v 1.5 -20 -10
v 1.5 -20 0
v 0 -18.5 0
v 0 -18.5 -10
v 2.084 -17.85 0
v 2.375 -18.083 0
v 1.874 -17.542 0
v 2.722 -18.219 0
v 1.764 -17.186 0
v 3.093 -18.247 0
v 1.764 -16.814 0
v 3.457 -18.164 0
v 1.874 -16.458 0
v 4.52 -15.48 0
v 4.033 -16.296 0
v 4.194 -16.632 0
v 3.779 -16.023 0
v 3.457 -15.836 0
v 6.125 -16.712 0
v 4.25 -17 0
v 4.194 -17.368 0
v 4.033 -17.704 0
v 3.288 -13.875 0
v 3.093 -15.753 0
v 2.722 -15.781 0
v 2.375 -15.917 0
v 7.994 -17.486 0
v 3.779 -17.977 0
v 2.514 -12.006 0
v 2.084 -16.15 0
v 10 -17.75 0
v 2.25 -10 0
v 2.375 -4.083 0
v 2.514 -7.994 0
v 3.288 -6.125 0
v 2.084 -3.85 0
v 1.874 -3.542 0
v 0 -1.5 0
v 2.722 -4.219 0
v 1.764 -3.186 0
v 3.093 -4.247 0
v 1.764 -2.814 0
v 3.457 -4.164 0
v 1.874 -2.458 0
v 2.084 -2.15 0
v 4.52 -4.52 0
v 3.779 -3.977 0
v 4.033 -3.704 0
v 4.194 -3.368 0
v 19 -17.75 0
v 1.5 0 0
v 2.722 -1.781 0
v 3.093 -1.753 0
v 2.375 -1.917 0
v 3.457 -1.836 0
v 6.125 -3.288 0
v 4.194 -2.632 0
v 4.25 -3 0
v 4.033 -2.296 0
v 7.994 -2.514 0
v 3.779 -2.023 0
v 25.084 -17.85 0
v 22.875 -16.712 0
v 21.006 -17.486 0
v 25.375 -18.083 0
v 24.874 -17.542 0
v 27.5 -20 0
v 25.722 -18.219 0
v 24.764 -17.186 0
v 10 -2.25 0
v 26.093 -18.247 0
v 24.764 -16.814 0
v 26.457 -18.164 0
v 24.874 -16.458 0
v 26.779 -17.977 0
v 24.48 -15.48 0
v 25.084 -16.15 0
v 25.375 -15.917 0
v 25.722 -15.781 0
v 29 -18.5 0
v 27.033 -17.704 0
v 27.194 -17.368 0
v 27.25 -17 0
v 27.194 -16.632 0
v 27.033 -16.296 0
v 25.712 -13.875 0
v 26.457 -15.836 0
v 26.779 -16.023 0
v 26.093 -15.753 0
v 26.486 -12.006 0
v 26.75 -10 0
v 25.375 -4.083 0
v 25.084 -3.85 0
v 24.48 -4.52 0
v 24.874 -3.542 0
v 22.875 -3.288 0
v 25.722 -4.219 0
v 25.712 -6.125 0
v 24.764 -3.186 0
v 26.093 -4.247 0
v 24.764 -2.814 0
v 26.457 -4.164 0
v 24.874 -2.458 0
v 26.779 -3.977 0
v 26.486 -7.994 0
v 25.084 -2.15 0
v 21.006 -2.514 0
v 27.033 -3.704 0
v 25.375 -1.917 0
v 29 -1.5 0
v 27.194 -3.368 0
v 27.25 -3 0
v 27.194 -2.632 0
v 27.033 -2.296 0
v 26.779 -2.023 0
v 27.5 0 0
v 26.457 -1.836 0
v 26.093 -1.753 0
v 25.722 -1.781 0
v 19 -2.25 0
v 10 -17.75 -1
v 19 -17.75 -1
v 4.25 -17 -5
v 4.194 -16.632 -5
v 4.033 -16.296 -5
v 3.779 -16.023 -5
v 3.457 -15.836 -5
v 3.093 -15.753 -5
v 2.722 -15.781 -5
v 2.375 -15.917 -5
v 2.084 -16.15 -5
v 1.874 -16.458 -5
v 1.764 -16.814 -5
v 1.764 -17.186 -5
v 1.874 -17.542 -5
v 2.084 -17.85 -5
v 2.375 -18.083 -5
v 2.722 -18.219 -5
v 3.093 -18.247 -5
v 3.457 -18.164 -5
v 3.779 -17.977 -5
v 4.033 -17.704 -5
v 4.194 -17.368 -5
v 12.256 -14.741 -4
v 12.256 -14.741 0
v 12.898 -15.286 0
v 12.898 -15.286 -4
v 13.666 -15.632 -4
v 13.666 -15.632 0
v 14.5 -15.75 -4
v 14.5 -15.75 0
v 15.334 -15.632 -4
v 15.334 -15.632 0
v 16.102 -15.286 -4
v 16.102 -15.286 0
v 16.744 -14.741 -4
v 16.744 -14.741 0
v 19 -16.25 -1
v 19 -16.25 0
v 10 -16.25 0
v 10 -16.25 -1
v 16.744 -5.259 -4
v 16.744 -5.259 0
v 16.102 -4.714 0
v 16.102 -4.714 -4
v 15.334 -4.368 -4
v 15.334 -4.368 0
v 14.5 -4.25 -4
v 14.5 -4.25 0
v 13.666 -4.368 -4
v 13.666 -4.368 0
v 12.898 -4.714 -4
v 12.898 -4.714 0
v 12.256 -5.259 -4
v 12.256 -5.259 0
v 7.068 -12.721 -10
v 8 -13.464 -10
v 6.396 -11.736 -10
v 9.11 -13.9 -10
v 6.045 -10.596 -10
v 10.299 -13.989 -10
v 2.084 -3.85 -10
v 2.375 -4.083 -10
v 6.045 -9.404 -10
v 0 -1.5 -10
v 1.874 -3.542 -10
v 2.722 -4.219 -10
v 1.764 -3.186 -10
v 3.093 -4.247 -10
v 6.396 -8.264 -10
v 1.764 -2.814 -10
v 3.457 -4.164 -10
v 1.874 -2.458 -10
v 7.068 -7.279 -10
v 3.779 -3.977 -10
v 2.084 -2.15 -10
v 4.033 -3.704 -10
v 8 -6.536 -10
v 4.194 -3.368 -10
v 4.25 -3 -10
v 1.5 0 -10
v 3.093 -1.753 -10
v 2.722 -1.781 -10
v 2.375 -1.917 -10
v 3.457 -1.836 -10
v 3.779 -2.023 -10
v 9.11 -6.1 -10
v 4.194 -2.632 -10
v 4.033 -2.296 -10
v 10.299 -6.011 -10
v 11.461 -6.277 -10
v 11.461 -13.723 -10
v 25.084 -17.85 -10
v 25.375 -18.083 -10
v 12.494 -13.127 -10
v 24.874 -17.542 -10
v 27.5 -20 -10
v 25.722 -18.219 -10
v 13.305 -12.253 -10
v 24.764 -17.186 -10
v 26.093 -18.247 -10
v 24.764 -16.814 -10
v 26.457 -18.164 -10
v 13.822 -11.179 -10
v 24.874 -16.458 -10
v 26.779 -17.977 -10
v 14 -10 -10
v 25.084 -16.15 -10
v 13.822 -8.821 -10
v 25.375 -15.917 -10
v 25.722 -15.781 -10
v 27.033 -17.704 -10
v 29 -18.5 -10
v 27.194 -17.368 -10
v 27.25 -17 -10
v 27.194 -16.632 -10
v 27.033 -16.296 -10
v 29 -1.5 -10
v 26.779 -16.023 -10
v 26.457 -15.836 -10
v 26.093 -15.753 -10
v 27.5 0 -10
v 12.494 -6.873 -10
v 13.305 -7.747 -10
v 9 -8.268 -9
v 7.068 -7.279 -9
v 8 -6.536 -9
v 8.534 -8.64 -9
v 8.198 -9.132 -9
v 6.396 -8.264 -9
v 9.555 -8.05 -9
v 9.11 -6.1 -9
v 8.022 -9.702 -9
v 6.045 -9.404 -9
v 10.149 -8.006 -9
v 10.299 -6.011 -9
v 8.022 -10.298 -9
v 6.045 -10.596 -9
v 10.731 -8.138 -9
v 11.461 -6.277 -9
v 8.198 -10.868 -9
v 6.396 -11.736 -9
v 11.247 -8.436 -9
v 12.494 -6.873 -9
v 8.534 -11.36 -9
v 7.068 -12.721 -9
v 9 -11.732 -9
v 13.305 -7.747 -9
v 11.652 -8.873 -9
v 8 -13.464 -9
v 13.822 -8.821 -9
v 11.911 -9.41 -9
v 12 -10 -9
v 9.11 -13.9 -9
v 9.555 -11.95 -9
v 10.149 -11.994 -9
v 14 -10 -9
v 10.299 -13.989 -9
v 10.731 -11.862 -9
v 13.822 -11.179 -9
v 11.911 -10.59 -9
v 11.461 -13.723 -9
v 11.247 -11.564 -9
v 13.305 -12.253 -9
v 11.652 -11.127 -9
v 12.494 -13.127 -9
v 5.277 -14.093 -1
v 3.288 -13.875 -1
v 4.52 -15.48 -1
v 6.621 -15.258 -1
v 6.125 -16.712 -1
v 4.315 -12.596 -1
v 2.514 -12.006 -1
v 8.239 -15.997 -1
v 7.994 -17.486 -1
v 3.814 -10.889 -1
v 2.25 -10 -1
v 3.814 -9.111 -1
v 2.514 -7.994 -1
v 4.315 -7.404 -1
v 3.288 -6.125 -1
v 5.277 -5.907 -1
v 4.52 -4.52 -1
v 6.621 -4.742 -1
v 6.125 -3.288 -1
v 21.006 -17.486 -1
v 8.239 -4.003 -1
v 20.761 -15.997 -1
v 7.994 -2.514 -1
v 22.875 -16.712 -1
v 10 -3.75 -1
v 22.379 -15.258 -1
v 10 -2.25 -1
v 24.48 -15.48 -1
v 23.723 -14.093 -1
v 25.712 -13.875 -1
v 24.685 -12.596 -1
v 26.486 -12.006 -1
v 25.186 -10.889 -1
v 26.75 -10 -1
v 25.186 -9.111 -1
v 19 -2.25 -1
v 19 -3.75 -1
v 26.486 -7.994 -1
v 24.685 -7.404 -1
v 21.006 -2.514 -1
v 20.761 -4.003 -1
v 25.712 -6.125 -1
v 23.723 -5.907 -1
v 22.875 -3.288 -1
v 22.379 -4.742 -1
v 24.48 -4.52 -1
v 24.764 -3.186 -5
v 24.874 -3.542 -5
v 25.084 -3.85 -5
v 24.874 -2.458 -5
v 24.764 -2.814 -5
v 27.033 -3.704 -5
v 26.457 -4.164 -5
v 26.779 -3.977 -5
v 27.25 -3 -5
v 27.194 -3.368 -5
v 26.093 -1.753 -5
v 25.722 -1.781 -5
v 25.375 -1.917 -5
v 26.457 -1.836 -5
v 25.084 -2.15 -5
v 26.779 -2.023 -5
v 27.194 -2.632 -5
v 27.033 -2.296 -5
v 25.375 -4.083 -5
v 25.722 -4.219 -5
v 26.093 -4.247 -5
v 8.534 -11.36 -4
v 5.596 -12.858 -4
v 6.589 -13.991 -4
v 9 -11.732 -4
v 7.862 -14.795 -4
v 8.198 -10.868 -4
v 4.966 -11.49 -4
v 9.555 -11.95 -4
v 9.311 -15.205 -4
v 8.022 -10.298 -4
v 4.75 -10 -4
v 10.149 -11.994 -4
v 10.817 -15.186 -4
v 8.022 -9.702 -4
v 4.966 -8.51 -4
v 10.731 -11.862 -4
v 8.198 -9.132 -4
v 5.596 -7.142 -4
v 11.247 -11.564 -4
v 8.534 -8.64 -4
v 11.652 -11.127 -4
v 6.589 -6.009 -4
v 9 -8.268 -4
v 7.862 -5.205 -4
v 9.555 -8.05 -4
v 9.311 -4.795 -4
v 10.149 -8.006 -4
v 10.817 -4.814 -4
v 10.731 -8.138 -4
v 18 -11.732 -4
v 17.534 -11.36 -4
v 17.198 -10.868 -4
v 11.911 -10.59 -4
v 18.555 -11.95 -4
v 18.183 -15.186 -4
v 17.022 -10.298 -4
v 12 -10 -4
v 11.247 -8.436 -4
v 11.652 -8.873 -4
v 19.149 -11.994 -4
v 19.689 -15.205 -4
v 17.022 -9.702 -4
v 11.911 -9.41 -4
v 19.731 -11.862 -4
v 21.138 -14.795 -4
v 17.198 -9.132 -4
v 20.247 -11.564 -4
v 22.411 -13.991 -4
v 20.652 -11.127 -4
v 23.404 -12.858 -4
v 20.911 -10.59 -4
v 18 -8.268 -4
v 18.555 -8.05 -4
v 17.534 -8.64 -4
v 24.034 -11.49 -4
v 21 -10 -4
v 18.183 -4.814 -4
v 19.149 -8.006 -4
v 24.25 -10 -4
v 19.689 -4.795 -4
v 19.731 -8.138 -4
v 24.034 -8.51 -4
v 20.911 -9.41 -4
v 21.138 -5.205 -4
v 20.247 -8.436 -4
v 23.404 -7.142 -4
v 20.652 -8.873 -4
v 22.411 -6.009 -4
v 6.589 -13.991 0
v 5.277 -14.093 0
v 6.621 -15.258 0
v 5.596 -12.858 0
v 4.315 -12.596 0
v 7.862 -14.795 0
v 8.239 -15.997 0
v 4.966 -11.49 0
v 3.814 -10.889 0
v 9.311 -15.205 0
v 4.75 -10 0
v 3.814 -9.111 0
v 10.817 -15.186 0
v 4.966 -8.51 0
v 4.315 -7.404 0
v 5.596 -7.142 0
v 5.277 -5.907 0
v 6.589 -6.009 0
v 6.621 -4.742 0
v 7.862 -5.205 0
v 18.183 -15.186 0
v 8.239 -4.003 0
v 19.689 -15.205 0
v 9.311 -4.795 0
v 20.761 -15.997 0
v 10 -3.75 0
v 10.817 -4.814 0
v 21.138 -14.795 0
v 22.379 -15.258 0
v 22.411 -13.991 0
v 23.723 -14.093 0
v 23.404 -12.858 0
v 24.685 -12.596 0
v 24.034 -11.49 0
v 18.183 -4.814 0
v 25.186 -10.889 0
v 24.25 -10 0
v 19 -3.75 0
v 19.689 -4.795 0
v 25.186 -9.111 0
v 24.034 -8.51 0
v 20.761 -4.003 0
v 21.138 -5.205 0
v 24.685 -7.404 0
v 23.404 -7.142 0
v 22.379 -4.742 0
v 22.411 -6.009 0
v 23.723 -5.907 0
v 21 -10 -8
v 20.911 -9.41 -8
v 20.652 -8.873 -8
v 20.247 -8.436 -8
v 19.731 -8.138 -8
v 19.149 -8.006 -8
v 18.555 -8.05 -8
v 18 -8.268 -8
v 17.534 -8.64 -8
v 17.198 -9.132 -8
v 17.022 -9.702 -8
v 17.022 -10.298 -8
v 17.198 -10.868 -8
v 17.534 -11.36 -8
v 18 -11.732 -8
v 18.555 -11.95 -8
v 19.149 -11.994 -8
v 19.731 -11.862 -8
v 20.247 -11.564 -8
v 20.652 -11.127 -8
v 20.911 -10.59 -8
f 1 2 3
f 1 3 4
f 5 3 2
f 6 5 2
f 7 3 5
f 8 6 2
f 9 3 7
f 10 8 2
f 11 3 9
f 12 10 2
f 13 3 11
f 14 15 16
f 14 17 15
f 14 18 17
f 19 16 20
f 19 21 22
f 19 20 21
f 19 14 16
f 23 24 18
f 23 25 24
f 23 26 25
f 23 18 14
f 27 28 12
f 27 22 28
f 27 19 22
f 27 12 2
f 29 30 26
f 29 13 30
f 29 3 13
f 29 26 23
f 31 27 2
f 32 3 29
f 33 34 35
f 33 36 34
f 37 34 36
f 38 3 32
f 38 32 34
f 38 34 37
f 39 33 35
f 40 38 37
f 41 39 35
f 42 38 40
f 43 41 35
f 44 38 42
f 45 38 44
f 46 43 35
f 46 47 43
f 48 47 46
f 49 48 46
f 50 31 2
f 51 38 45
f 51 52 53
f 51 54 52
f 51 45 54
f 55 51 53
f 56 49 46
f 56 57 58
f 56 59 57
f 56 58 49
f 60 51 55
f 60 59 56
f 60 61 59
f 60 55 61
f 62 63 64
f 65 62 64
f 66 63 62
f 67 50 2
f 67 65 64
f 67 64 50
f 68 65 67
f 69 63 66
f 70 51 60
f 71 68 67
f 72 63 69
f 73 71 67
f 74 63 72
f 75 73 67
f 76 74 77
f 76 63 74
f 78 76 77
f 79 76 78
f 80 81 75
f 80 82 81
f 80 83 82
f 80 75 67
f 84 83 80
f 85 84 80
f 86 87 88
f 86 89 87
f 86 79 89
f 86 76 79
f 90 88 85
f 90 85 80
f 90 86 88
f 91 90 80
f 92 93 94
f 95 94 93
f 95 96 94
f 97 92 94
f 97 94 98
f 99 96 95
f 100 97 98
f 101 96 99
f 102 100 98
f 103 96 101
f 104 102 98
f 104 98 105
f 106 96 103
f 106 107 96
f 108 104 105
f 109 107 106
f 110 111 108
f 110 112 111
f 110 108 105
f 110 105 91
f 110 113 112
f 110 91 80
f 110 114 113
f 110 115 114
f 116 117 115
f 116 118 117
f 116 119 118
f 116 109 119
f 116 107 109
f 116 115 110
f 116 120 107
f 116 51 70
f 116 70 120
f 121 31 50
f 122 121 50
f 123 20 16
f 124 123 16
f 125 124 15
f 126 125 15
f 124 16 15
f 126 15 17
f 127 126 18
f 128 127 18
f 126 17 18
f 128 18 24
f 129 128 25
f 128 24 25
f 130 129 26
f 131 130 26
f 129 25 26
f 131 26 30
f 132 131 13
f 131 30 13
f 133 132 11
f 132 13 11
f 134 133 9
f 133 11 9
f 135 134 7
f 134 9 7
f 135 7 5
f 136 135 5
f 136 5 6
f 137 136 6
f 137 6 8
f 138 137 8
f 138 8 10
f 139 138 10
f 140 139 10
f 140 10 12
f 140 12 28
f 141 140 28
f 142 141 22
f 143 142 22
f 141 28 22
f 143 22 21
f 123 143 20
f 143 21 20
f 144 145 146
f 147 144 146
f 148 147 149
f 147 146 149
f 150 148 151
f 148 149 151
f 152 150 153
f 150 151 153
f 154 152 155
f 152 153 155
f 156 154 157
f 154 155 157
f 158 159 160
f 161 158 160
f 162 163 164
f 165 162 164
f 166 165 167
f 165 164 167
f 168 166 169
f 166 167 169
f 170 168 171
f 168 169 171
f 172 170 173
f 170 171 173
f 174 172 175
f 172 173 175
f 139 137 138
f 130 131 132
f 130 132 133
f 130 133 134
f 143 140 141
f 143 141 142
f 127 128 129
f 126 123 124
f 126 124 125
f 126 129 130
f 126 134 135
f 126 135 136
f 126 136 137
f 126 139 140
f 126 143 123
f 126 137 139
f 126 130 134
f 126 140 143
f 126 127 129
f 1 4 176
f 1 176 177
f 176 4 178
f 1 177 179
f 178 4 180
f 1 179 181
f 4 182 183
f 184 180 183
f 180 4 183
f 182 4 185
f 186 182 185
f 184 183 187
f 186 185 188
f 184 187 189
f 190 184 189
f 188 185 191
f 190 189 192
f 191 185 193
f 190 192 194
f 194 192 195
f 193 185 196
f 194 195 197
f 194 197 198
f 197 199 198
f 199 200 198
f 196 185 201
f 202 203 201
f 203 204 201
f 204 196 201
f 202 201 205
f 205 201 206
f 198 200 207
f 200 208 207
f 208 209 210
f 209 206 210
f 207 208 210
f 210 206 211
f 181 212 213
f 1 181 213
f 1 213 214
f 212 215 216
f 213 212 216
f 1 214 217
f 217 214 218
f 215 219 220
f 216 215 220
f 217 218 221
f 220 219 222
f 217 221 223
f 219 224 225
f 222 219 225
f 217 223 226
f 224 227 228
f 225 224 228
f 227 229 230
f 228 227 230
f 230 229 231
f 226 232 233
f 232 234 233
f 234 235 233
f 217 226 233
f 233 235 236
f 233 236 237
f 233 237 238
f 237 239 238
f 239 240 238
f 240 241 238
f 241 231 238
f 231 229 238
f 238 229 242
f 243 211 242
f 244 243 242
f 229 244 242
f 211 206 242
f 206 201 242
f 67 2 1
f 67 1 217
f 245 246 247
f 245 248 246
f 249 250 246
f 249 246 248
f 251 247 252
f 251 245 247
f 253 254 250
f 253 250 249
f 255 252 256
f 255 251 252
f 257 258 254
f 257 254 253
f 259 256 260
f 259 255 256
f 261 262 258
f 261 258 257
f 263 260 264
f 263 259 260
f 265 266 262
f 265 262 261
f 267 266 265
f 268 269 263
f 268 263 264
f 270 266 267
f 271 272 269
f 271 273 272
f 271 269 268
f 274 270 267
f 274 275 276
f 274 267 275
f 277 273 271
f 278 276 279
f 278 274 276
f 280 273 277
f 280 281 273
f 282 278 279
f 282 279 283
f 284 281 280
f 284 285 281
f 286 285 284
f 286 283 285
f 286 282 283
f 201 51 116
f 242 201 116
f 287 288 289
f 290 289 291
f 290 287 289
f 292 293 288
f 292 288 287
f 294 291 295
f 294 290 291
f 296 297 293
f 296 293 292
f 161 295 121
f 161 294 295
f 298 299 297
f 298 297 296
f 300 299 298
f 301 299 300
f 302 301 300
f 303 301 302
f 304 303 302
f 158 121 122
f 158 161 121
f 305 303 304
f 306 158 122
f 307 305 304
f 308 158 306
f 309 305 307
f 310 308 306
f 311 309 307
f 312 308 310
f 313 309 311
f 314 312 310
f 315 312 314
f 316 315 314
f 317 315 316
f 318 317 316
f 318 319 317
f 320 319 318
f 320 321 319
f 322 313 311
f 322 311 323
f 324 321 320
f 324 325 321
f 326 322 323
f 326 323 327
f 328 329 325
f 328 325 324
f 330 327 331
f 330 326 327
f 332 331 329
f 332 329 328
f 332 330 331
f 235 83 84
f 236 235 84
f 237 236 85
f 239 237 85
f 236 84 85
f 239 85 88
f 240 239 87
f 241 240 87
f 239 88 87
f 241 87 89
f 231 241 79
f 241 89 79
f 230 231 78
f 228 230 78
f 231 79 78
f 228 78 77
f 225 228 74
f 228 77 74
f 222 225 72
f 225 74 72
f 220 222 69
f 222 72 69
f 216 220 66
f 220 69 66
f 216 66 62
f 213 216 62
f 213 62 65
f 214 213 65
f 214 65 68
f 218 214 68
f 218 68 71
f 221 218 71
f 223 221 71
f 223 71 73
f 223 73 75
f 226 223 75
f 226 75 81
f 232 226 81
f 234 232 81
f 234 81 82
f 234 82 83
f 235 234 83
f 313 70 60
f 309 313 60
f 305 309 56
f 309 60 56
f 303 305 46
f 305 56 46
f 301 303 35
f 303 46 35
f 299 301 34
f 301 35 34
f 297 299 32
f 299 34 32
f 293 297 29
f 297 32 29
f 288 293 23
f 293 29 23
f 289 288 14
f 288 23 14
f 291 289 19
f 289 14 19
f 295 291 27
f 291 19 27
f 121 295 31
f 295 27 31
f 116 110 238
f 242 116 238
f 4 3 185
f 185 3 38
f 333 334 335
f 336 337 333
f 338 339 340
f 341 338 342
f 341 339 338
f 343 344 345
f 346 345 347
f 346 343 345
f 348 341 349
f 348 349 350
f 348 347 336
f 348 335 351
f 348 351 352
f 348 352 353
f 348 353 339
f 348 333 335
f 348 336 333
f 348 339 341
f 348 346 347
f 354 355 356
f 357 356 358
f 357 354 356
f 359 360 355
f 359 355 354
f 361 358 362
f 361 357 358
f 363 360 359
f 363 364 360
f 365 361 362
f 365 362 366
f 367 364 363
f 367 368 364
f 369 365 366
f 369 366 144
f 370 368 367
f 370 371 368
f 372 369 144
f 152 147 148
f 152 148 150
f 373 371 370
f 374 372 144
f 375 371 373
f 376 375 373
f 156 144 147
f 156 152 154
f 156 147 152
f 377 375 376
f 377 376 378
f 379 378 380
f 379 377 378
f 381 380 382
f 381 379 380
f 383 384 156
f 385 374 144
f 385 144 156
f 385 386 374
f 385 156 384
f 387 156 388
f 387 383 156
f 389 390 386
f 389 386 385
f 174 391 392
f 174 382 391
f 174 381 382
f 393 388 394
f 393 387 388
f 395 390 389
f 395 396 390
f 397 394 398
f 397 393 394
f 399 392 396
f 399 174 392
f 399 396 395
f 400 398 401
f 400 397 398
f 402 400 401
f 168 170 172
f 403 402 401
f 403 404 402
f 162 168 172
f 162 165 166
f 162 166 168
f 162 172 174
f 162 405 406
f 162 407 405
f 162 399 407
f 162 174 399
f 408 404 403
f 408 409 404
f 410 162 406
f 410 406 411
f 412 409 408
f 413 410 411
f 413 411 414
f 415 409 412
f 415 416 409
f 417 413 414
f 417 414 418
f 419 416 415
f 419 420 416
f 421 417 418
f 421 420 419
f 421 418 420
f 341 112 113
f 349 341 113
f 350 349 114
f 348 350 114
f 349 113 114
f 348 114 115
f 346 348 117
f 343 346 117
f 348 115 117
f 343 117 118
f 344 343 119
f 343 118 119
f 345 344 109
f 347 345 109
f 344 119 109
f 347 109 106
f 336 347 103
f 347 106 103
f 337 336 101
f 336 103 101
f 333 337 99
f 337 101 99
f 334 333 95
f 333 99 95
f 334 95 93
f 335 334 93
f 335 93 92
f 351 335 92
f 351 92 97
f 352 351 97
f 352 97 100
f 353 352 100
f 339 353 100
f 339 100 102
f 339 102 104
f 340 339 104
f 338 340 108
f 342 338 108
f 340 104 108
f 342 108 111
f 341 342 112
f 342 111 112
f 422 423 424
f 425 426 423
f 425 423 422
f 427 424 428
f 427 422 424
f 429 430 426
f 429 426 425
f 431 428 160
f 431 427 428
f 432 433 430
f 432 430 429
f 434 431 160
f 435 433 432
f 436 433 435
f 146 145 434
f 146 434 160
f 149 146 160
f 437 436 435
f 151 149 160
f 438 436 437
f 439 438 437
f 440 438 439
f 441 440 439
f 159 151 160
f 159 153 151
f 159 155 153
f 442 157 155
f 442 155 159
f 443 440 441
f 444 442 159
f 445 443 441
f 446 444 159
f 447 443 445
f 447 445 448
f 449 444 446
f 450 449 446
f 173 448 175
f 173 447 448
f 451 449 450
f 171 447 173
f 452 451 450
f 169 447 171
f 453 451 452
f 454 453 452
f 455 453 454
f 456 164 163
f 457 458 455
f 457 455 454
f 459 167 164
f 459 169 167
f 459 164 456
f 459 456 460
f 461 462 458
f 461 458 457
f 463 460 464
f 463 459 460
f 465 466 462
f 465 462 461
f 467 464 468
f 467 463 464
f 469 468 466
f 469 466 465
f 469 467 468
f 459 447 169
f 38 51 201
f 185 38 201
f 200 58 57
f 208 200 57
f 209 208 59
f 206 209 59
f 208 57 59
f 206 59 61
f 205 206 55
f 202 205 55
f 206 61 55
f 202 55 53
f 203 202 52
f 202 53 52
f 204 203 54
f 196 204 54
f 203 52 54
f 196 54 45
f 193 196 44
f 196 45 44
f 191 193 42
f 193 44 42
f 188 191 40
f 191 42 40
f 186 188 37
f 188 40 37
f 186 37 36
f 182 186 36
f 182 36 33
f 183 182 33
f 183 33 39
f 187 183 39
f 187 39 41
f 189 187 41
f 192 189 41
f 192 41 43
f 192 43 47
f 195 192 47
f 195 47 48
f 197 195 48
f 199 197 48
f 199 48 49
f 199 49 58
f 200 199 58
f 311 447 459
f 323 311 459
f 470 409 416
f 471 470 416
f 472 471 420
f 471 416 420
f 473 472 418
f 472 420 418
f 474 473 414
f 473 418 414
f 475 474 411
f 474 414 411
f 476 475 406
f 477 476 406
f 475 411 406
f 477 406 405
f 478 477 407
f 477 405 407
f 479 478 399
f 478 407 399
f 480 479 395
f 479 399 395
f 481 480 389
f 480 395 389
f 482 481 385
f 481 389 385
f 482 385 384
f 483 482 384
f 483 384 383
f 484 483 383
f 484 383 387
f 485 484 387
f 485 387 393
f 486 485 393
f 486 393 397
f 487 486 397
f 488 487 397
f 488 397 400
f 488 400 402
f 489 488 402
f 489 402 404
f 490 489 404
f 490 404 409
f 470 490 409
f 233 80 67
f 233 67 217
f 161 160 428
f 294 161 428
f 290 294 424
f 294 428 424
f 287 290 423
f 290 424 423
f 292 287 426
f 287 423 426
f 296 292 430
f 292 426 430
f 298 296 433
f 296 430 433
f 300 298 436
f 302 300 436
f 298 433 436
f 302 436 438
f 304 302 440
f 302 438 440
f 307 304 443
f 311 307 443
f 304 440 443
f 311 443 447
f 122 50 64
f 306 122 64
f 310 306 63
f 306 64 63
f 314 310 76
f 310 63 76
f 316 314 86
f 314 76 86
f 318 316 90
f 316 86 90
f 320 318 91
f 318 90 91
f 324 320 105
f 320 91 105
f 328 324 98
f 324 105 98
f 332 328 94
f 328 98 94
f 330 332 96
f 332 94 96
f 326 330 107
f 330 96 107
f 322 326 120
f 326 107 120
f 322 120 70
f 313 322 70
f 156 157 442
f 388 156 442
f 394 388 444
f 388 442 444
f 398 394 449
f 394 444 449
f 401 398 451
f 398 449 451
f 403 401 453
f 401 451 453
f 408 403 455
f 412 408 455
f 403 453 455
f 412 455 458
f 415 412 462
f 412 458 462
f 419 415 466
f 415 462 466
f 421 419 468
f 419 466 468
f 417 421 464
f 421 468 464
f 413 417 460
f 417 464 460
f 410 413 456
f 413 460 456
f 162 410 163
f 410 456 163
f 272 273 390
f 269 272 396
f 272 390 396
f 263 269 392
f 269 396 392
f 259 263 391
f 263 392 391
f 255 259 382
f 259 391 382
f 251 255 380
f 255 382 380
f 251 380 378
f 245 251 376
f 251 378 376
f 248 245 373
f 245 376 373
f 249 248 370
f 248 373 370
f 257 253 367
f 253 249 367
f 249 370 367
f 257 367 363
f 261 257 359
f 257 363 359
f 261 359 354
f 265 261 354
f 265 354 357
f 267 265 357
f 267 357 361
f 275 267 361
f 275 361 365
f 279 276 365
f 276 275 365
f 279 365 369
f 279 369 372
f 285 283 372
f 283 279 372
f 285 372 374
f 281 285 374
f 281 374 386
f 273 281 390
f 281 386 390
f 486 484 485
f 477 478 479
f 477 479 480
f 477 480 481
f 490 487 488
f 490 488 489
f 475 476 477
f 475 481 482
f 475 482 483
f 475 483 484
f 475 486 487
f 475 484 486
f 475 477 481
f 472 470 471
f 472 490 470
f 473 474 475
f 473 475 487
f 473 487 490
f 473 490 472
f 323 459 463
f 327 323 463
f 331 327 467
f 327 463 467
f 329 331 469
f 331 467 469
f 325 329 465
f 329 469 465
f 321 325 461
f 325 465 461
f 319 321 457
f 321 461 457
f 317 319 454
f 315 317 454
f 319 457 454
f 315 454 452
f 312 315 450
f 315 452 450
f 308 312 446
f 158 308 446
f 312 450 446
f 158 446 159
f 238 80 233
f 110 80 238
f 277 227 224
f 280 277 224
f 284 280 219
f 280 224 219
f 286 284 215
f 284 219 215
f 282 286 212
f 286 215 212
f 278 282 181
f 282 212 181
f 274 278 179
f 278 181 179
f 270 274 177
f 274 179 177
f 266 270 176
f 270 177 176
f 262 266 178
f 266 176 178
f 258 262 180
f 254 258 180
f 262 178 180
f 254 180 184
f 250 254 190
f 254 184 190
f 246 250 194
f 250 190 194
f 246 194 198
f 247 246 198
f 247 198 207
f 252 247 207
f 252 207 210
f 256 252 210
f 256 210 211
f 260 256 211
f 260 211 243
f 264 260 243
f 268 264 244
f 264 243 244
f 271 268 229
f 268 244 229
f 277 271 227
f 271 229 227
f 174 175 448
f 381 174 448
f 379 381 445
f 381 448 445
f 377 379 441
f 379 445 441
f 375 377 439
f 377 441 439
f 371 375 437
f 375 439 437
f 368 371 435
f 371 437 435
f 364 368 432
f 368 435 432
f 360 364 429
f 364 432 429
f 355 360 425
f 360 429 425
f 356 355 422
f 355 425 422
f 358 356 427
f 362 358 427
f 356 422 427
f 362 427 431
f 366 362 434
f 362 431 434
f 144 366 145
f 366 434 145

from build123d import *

# Parameters (mm, degrees)
F0_W     = 29
F0_H     = 20
F0_R     = 1.25
F0_R_2   = 2
F1_DEPTH = 10
F2_DEPTH = 5
F3_DEPTH = 1
F4_DEPTH = 8
F5_DEPTH = 4
F6_R     = 4
F6_R_2   = 2
F7_DEPTH = 1
F8_SIZE  = 1.5


# Not quite as in the source:
# - a feature names something its author has since deleted; it is built from what else it names


with BuildPart() as f1:
    # F0 (on Top) → F1 (new body)
    with BuildSketch(Plane.XY):
        with Locations((14.5, -10)):
            Rectangle(F0_W, F0_H)
        with Locations((3, -17)):
            Circle(F0_R, mode=Mode.SUBTRACT)
        with Locations((26, -17)):
            Circle(F0_R, mode=Mode.SUBTRACT)
        with Locations((3, -3)):
            Circle(F0_R, mode=Mode.SUBTRACT)
        with BuildLine():
            Line((19, -17.75), (10, -17.75))
            ThreePointArc((10, -17.75), (2.25, -10), (10, -2.25))
            Line((10, -2.25), (19, -2.25))
            ThreePointArc((19, -2.25), (26.75, -10), (19, -17.75))
        make_face(mode=Mode.SUBTRACT)
        with Locations((26, -3)):
            Circle(F0_R, mode=Mode.SUBTRACT)
        with BuildLine():
            ThreePointArc((10, -2.25), (2.25, -10), (10, -17.75))
            Line((10, -17.75), (19, -17.75))
            ThreePointArc((19, -17.75), (26.75, -10), (19, -2.25))
            Line((19, -2.25), (10, -2.25))
        make_face()
        with BuildLine():
            ThreePointArc((10, -16.25), (3.75, -10), (10, -3.75))
            Line((10, -3.75), (19, -3.75))
            ThreePointArc((19, -3.75), (25.25, -10), (19, -16.25))
            Line((19, -16.25), (10, -16.25))
        make_face(mode=Mode.SUBTRACT)
        with BuildLine():
            Line((19, -3.75), (10, -3.75))
            ThreePointArc((10, -3.75), (3.75, -10), (10, -16.25))
            Line((10, -16.25), (19, -16.25))
            ThreePointArc((19, -16.25), (25.25, -10), (19, -3.75))
        make_face()
        with BuildLine():
            ThreePointArc((16.7443308628, -5.25927677), (24.25, -10), (16.7443308628, -14.74072323))
            ThreePointArc((16.7443308628, -14.74072323), (14.5, -15.75), (12.2556691372, -14.74072323))
            ThreePointArc((12.2556691372, -14.74072323), (4.75, -10), (12.2556691372, -5.25927677))
            ThreePointArc((12.2556691372, -5.25927677), (14.5, -4.25), (16.7443308628, -5.25927677))
        make_face(mode=Mode.SUBTRACT)
        with BuildLine():
            ThreePointArc((12.2556691372, -14.74072323), (14.5, -15.75), (16.7443308628, -14.74072323))
            ThreePointArc((16.7443308628, -14.74072323), (24.25, -10), (16.7443308628, -5.25927677))
            ThreePointArc((16.7443308628, -5.25927677), (14.5, -4.25), (12.2556691372, -5.25927677))
            ThreePointArc((12.2556691372, -5.25927677), (4.75, -10), (12.2556691372, -14.74072323))
        make_face()
        with Locations((10, -10)):
            Circle(F0_R_2, mode=Mode.SUBTRACT)
        with Locations((19, -10)):
            Circle(F0_R_2, mode=Mode.SUBTRACT)
        with Locations((19, -10)):
            Circle(F0_R_2)
        with Locations((3, -17)):
            Circle(F0_R)
        with Locations((26, -3)):
            Circle(F0_R)
    extrude(amount=-F1_DEPTH)

    # F0 (on Top) → F2 (cut)
    with BuildSketch(Plane.XY):
        with Locations((3, -3)):
            Circle(F0_R)
        with Locations((26, -3)):
            Circle(F0_R)
        with Locations((26, -17)):
            Circle(F0_R)
        with Locations((3, -17)):
            Circle(F0_R)
    extrude(amount=-F2_DEPTH, mode=Mode.SUBTRACT)

    # F0 (on Top) → F3 (cut)
    with BuildSketch(Plane.XY):
        with BuildLine():
            ThreePointArc((10, -2.25), (2.25, -10), (10, -17.75))
            Line((10, -17.75), (19, -17.75))
            ThreePointArc((19, -17.75), (26.75, -10), (19, -2.25))
            Line((19, -2.25), (10, -2.25))
        make_face()
        with BuildLine():
            ThreePointArc((10, -16.25), (3.75, -10), (10, -3.75))
            Line((10, -3.75), (19, -3.75))
            ThreePointArc((19, -3.75), (25.25, -10), (19, -16.25))
            Line((19, -16.25), (10, -16.25))
        make_face(mode=Mode.SUBTRACT)
    extrude(amount=-F3_DEPTH, mode=Mode.SUBTRACT)

    # F0 (on Top) → F4 (cut)
    with BuildSketch(Plane.XY):
        with Locations((19, -10)):
            Circle(F0_R_2)
    extrude(amount=-F4_DEPTH, mode=Mode.SUBTRACT)

    # F0 (on Top) → F5 (cut)
    with BuildSketch(Plane.XY):
        with BuildLine():
            ThreePointArc((12.2556691372, -14.74072323), (14.5, -15.75), (16.7443308628, -14.74072323))
            ThreePointArc((16.7443308628, -14.74072323), (24.25, -10), (16.7443308628, -5.25927677))
            ThreePointArc((16.7443308628, -5.25927677), (14.5, -4.25), (12.2556691372, -5.25927677))
            ThreePointArc((12.2556691372, -5.25927677), (4.75, -10), (12.2556691372, -14.74072323))
        make_face()
        with Locations((10, -10)):
            Circle(F0_R_2, mode=Mode.SUBTRACT)
        with Locations((19, -10)):
            Circle(F0_R_2, mode=Mode.SUBTRACT)
    extrude(amount=-F5_DEPTH, mode=Mode.SUBTRACT)

    # F6 (on face) → F7 (cut)
    with BuildSketch(Plane(origin=(0, 0, -10), x_dir=(1, 0, 0), z_dir=(0, 0, -1))):
        with Locations((10, 10)):
            Circle(F6_R)
        with Locations((10, 10)):
            Circle(F6_R_2, mode=Mode.SUBTRACT)
    extrude(amount=-F7_DEPTH, mode=Mode.SUBTRACT)

    # F8
    f8_edges = [f1.edges().sort_by_distance(p)[0] for p in [
        (29, -20, -5),
        (0, -20, -5),
        (0, 0, -5),
        (29, 0, -5),
    ]]
    chamfer(f8_edges, length=F8_SIZE)


solid = f1.part
